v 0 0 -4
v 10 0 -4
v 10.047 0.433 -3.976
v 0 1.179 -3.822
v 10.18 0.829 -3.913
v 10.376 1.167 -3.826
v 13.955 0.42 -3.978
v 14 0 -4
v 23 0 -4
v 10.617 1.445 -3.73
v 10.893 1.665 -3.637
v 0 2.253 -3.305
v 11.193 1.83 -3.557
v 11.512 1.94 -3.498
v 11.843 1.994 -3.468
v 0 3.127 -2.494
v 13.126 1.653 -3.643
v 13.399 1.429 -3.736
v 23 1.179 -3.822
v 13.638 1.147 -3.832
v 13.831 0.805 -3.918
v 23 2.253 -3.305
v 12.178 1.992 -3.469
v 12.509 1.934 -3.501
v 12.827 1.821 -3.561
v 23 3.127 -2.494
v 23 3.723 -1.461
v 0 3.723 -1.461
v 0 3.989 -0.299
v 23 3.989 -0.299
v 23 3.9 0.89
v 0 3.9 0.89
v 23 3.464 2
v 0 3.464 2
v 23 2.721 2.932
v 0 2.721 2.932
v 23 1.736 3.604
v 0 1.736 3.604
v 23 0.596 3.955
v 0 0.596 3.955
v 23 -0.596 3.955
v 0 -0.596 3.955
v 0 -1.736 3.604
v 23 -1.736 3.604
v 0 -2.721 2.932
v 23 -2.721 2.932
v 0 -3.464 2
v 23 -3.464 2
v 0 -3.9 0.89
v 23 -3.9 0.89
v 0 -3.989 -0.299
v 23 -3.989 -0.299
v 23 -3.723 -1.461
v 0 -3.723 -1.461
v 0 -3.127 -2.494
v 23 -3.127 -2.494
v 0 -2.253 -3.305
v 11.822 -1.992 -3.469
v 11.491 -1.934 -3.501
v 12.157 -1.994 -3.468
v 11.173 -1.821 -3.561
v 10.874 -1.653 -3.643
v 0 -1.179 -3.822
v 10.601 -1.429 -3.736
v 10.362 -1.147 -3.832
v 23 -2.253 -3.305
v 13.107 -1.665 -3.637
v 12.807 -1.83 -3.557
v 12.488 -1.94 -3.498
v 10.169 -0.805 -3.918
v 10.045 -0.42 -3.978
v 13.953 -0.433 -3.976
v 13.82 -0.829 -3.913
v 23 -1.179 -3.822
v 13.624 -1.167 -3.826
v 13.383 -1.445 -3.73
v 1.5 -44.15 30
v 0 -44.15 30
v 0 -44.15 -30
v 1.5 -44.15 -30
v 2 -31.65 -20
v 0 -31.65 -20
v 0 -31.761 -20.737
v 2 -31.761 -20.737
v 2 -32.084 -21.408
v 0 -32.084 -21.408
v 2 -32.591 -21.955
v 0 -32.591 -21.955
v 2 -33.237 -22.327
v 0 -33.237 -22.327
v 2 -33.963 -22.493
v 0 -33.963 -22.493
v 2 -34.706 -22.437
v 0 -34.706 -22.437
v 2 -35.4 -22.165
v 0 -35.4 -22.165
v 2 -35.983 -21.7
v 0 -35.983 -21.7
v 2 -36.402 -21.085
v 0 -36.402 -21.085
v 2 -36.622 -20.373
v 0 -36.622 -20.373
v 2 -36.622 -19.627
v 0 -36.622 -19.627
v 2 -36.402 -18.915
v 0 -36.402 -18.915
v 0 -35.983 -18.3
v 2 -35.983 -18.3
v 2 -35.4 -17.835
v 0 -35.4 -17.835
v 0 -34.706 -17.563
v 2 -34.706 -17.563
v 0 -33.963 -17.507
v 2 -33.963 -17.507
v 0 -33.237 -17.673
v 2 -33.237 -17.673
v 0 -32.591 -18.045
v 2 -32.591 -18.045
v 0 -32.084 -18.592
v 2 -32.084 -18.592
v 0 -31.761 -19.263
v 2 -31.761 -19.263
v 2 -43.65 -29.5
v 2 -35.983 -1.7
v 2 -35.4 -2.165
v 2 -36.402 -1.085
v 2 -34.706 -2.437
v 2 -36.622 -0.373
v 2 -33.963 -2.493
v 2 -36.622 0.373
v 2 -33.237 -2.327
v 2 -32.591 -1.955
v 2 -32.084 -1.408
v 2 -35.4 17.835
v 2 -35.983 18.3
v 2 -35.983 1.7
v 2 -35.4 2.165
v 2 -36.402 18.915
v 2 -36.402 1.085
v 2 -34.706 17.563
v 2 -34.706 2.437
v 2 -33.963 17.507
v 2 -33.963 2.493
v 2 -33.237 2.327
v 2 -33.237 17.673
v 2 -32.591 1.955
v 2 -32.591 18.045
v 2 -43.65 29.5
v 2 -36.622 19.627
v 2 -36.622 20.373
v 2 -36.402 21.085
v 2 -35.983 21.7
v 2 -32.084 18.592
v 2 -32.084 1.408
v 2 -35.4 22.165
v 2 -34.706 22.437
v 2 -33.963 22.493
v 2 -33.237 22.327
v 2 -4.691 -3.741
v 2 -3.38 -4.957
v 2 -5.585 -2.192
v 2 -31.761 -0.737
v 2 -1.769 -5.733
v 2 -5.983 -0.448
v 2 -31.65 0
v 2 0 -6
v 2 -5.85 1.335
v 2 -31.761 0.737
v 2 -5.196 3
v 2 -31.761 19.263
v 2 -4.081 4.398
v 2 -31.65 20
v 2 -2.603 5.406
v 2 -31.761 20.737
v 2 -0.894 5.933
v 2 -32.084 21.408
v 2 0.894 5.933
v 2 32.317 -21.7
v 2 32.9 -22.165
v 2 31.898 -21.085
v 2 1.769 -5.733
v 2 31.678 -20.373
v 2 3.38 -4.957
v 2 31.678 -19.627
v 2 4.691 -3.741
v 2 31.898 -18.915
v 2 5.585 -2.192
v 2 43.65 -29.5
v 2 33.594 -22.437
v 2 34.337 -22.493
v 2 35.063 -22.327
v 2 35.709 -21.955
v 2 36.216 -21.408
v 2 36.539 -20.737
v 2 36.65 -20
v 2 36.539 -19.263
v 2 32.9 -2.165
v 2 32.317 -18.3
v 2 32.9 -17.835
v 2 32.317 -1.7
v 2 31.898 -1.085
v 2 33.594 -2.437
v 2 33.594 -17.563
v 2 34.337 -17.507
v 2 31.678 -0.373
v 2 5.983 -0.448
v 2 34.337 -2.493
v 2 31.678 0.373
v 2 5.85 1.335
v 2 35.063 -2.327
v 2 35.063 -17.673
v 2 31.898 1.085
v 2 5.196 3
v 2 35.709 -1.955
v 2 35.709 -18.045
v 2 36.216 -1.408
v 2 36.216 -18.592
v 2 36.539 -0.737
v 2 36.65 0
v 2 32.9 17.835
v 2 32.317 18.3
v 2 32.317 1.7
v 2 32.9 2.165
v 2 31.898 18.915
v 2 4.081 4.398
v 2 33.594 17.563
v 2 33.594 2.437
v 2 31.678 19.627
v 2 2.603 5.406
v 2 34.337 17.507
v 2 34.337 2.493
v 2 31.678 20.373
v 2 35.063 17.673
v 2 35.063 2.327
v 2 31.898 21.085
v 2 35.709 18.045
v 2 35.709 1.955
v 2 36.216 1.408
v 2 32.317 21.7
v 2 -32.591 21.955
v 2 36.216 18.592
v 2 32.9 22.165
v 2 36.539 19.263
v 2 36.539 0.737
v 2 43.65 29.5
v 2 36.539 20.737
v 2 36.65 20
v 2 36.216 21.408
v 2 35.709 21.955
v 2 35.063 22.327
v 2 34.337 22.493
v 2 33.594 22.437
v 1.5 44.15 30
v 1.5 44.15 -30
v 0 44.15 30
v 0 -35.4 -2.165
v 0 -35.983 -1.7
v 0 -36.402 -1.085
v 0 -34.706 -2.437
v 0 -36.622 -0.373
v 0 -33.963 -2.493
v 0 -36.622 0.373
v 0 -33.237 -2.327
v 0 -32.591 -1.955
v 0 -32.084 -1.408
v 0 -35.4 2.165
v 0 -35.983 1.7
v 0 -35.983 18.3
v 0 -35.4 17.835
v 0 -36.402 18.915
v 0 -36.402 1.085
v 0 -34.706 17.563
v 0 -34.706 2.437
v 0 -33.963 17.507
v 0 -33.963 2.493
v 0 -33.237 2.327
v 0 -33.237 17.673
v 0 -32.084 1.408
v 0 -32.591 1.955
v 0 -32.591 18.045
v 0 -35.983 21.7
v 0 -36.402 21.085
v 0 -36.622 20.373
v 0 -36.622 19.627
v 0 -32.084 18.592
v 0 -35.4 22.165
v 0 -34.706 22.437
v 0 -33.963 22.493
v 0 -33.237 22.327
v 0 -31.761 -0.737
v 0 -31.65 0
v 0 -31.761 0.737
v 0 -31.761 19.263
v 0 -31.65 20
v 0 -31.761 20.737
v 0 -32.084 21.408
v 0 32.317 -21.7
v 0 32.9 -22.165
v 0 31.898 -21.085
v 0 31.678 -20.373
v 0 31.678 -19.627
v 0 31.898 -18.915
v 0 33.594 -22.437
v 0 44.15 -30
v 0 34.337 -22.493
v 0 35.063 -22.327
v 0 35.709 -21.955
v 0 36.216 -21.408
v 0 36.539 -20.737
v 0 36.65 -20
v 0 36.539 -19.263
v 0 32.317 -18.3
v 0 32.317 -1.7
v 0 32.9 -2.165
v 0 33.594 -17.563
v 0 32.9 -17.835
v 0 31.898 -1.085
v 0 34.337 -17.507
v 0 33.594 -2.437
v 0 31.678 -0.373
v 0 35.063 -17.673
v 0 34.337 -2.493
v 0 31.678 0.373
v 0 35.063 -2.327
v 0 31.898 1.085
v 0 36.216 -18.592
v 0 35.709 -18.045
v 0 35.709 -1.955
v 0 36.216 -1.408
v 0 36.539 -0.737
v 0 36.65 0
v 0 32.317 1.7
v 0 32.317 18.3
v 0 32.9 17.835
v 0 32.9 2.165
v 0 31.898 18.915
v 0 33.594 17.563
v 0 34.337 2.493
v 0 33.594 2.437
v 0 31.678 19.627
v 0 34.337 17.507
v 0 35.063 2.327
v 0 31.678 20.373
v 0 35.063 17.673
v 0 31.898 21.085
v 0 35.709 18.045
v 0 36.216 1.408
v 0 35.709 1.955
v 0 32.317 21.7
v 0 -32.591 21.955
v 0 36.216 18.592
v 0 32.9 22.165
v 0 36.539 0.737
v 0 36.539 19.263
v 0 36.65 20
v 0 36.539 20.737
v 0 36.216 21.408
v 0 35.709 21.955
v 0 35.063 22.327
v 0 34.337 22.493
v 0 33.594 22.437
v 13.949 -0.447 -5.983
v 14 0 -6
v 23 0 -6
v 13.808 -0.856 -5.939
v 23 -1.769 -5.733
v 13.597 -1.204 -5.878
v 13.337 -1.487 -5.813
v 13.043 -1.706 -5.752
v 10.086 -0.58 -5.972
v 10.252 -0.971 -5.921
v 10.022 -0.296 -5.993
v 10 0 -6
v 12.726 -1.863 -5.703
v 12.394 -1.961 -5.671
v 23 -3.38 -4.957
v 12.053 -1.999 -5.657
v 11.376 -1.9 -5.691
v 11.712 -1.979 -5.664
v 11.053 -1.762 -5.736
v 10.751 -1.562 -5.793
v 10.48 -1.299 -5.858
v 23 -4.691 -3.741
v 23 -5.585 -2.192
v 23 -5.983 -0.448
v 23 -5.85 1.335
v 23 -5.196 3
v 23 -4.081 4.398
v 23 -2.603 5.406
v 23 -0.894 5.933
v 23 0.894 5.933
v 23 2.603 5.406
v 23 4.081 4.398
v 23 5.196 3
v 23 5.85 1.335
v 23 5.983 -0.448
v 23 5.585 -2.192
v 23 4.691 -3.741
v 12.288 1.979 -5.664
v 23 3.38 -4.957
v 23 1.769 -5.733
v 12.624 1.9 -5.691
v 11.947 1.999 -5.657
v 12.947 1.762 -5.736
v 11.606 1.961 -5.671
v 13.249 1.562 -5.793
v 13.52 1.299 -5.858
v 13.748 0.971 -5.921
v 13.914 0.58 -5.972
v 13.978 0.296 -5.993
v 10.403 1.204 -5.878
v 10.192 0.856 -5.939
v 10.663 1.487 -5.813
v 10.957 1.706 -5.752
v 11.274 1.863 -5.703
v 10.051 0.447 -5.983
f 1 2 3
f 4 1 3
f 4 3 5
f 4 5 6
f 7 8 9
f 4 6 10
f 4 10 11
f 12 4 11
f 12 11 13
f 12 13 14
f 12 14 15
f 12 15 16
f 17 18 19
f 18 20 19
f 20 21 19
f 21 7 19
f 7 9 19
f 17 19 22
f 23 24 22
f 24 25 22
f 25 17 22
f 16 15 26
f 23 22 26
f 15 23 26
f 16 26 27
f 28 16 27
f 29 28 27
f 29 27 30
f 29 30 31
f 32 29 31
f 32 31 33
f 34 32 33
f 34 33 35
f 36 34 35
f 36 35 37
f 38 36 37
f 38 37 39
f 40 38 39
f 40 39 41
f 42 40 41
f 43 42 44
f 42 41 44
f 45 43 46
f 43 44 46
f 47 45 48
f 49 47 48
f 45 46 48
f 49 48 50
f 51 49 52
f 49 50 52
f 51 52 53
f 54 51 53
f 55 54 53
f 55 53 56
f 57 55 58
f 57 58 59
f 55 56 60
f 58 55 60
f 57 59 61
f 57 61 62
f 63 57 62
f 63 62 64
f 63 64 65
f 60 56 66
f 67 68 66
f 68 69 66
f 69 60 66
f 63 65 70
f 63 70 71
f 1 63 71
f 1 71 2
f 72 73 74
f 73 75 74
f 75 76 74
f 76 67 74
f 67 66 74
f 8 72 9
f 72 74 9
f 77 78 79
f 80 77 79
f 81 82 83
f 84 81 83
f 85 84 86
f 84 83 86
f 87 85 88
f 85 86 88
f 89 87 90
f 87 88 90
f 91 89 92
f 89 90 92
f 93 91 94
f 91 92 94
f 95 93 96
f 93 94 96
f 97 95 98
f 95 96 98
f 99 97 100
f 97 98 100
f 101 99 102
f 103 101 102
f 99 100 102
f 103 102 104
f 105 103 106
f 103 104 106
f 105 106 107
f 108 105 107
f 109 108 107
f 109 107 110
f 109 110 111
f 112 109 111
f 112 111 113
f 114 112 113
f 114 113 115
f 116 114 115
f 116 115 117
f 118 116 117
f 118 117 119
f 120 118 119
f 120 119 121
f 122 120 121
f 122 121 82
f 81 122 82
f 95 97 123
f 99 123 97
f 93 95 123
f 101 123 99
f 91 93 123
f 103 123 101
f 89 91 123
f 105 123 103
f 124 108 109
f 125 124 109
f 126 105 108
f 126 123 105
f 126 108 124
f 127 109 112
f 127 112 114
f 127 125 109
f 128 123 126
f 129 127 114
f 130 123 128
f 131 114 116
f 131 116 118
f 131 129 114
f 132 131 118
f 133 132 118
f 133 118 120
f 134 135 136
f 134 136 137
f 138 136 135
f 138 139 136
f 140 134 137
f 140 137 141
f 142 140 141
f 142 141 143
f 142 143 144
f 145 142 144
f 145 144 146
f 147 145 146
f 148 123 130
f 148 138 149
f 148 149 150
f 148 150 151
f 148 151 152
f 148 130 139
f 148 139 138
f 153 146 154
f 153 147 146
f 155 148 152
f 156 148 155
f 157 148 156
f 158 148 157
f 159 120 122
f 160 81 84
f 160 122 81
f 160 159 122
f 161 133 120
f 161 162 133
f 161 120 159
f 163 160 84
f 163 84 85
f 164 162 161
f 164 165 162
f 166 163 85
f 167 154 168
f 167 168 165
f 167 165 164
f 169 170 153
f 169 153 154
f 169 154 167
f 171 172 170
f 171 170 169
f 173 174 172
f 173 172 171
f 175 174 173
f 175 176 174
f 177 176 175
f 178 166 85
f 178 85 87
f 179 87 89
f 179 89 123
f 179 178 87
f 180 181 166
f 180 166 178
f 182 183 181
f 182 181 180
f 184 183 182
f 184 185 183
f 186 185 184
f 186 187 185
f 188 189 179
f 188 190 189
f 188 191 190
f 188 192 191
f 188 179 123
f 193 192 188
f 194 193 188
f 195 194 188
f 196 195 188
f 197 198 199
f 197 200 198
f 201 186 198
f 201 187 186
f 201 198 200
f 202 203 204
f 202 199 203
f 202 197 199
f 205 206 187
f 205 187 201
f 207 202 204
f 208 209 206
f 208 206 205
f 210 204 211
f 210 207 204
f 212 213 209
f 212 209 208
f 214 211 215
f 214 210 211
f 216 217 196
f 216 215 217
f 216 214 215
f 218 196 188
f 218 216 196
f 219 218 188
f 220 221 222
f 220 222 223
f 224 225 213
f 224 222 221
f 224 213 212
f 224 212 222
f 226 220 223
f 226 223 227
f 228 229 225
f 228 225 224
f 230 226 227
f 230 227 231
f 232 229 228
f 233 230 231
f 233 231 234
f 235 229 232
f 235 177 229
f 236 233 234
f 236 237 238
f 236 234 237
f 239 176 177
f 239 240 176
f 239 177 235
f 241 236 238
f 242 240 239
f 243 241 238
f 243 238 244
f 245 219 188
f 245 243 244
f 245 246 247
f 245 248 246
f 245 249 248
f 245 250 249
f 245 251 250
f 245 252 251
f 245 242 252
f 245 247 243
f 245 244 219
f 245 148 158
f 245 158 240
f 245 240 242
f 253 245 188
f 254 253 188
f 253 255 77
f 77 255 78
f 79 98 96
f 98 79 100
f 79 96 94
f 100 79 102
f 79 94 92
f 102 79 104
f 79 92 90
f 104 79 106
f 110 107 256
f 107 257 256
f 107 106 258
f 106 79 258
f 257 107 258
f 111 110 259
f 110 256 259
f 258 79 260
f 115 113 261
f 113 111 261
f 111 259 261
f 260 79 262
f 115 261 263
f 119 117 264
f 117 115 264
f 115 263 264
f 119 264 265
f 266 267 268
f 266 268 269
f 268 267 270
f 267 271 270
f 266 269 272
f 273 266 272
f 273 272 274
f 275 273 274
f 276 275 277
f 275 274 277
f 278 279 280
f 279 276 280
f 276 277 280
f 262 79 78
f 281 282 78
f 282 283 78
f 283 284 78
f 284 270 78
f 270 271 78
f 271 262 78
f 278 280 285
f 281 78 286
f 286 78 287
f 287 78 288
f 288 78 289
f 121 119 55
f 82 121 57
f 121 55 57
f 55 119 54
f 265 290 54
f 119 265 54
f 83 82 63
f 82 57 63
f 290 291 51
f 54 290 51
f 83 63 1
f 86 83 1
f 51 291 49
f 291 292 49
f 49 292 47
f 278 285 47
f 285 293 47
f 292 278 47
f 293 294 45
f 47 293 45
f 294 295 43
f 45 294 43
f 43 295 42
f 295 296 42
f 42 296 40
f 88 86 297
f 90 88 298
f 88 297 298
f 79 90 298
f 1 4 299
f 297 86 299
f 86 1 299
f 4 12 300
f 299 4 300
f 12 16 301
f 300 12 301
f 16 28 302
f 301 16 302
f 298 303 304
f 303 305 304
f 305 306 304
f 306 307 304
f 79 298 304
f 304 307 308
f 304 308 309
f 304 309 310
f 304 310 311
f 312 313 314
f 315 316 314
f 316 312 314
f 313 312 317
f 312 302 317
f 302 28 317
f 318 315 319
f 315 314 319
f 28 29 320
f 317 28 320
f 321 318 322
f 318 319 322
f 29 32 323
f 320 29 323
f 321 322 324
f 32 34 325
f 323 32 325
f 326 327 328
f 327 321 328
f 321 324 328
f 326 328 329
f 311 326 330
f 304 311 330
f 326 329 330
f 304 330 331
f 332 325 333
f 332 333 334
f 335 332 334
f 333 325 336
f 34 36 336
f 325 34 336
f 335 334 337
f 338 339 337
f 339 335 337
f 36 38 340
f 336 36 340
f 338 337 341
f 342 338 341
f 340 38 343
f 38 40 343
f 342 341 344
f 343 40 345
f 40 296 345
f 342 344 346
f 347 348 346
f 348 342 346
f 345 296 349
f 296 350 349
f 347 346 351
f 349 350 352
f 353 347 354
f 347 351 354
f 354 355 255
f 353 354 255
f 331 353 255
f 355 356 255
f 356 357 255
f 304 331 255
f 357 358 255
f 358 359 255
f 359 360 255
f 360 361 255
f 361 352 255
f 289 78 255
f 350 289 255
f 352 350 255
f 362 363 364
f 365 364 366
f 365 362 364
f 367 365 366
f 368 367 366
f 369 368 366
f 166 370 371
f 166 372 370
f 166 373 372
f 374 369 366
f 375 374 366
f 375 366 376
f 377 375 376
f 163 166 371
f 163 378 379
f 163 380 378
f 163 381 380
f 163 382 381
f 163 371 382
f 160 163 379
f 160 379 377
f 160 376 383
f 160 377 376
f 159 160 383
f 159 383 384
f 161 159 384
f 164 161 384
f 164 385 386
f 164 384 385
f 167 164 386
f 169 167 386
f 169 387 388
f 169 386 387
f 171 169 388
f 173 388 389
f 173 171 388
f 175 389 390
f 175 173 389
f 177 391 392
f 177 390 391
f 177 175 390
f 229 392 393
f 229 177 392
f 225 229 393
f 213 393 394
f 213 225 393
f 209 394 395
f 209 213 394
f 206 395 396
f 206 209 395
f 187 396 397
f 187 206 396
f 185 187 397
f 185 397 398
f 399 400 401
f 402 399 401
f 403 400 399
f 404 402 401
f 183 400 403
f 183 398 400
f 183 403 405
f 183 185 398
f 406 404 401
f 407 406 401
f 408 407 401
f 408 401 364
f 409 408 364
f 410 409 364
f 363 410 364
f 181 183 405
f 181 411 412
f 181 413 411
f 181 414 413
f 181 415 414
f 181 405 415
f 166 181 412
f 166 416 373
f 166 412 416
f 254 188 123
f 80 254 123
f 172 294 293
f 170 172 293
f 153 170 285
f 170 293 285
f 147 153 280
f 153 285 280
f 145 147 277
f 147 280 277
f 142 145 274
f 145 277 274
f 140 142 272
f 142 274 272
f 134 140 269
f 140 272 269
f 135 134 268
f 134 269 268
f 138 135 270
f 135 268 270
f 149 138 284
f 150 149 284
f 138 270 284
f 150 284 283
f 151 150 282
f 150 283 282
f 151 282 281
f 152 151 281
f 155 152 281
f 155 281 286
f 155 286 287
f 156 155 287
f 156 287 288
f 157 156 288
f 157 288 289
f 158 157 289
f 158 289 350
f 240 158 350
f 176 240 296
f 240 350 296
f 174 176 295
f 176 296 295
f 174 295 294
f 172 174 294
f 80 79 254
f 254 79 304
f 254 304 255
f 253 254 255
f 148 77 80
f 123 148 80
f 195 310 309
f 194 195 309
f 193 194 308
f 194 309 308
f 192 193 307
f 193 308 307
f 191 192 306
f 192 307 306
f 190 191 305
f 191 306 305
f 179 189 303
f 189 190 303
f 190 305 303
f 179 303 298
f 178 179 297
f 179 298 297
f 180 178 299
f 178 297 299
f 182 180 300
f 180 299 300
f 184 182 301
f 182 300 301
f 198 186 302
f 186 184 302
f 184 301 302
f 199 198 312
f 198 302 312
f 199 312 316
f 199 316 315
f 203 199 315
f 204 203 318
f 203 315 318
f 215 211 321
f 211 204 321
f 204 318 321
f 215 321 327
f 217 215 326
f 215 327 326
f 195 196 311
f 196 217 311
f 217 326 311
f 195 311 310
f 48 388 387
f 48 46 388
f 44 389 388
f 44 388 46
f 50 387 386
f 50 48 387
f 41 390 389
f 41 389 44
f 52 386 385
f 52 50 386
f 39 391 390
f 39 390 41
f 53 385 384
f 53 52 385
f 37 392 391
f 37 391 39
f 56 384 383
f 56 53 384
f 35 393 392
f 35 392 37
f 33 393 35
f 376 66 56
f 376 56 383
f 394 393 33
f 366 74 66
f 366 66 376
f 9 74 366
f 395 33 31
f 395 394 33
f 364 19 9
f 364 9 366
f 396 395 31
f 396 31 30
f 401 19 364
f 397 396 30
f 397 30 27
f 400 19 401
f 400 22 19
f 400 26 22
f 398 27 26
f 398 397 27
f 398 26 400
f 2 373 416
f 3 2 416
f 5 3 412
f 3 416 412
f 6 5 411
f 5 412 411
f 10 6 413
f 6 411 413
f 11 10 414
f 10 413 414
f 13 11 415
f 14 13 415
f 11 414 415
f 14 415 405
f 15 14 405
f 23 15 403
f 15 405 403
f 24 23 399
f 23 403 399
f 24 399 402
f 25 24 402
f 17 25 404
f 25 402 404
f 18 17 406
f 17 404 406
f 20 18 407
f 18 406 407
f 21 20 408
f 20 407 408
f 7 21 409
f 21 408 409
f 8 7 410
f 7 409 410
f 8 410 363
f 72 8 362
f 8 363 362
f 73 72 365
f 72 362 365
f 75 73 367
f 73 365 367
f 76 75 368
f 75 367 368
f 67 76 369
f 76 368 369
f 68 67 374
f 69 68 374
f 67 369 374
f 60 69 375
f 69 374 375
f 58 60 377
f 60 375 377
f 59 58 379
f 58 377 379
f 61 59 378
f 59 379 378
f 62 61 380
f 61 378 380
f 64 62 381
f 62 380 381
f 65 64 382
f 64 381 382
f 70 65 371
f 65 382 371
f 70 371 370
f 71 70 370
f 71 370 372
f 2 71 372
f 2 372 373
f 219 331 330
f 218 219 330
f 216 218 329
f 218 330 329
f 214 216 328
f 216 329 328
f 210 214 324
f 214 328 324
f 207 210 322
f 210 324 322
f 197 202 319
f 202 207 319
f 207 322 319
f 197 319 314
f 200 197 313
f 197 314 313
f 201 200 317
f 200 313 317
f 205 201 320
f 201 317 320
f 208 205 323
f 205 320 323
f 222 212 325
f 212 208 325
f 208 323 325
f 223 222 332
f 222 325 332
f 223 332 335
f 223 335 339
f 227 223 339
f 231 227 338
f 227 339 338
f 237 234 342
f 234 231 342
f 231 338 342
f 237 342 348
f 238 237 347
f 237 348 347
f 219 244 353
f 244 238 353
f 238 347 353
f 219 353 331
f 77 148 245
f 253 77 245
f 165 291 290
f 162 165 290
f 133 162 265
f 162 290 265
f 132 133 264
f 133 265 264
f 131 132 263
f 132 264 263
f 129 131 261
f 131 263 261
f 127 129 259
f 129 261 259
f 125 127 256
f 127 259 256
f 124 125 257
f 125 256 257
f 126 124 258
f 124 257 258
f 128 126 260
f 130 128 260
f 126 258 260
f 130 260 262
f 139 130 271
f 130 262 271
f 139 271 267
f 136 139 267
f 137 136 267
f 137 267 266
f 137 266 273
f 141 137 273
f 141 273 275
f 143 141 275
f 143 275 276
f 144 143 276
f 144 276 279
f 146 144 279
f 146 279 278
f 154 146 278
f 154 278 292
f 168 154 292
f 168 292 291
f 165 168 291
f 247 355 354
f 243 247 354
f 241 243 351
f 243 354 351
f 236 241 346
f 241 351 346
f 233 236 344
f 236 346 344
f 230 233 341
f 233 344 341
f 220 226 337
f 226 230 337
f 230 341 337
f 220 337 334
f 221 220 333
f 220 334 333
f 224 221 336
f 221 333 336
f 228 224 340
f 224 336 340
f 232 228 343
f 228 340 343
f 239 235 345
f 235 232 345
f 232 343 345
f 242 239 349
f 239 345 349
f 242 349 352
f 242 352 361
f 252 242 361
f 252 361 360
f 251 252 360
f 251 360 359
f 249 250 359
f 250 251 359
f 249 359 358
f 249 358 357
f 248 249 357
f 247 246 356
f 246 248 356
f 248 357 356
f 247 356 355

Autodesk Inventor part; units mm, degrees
ref_plane "YZ Plane" through (0, 0, 0) normal (1, 0, 0) x (0, 1, 0)
ref_plane "XZ Plane" through (0, 0, 0) normal (0, 1, 0) x (-1, 0, 0)
sketch "Sketch1" plane through (0, 0, 0) normal (1, 0, 0) x (0, 1, 0)
  line L0 (44.15, 30) -> (-44.15, 30)
  line L1 (-44.15, 30) -> (-44.15, -30)
  line L2 (-44.15, -30) -> (44.15, -30)
  line L3 (44.15, -30) -> (44.15, 30)
  line L4 (44.15, 30) -> (-44.15, -30) construction
  line L5 (-44.15, 30) -> (44.15, -30) construction
  circle A0 centre (0, 0) radius 4
  circle A1 centre (0, 0) radius 6
  line L6 (44.15, 30) -> (44.15, 20)
  line L7 (44.15, 20) -> (34.15, 20)
  line L8 (44.15, -30) -> (44.15, -20)
  line L9 (44.15, -20) -> (34.15, -20)
  line L10 (-44.15, 30) -> (-44.15, 20)
  line L11 (-44.15, 20) -> (-34.15, 20)
  line L12 (-44.15, -30) -> (-44.15, -20)
  line L13 (-44.15, -20) -> (-34.15, -20)
  line L14 (-44.15, 0) -> (-34.15, 0)
  line L15 (44.15, 0) -> (34.15, 0)
  circle A2 centre (34.15, 20) radius 2.5
  circle A3 centre (34.15, 0) radius 2.5
  circle A4 centre (34.15, -20) radius 2.5
  circle A5 centre (-34.15, 20) radius 2.5
  circle A6 centre (-34.15, 0) radius 2.5
  circle A7 centre (-34.15, -20) radius 2.5
  dimension "d0" = 88.3
  dimension "d1" = 60
  dimension "d2" = 8
  dimension "d3" = 12
  dimension "d4" = 10
  dimension "d5" = 10
  dimension "d6" = 10
  dimension "d7" = 10
  dimension "d8" = 10
  dimension "d9" = 10
  dimension "d10" = 10
  dimension "d11" = 10
  dimension "d12" = 10
  dimension "d13" = 10
  dimension "d14" = 5
  dimension "d15" = 5
  dimension "d16" = 5
  dimension "d17" = 5
  dimension "d18" = 5
  dimension "d19" = 5
extrude "Extrusion1" add sketch "Sketch1" along normal blind 2 contours L3 L2 L1 L0
sketch "Sketch2" plane through (2, 0, 0) normal (1, 0, 0) x (0, 0, -1)
  circle A0 centre (0, 0) radius 6
  circle A1 centre (0, 0) radius 4
  dimension "d22" = 12
  dimension "d23" = 8
extrude "Extrusion2" add sketch "Sketch2" along normal blind 21 and the other way blind 2
ref_plane "Work Plane1" through (2, 0, -6) normal (0, 0, -1) x (-1, 0, 0)
sketch "Sketch3" plane through (2, 0, -6) normal (0, 0, -1) x (-1, 0, 0)
  line L0 (-21, 6) -> (-21, -6) projected
  line L1 (-21, 0) -> (-10, 0)
  circle A0 centre (-10, 0) radius 2
  point P0 (2, 0)
  dimension "d28" = 11
  dimension "d29" = 4
extrude "Extrusion3" cut sketch "Sketch3" against normal blind 5
thread "Thread1" size "M4x0.7" class "6H" standard "ANSI Metric M Profile" length 15
chamfer "Chamfer1" distance 0.5 angle 45 4 edges at (2, 44.15, 0) (2, 0, -30) (2, 0, 30) (2, -44.15, 0)
properties part number "ax4_holder" material "Iron, Malleable"
